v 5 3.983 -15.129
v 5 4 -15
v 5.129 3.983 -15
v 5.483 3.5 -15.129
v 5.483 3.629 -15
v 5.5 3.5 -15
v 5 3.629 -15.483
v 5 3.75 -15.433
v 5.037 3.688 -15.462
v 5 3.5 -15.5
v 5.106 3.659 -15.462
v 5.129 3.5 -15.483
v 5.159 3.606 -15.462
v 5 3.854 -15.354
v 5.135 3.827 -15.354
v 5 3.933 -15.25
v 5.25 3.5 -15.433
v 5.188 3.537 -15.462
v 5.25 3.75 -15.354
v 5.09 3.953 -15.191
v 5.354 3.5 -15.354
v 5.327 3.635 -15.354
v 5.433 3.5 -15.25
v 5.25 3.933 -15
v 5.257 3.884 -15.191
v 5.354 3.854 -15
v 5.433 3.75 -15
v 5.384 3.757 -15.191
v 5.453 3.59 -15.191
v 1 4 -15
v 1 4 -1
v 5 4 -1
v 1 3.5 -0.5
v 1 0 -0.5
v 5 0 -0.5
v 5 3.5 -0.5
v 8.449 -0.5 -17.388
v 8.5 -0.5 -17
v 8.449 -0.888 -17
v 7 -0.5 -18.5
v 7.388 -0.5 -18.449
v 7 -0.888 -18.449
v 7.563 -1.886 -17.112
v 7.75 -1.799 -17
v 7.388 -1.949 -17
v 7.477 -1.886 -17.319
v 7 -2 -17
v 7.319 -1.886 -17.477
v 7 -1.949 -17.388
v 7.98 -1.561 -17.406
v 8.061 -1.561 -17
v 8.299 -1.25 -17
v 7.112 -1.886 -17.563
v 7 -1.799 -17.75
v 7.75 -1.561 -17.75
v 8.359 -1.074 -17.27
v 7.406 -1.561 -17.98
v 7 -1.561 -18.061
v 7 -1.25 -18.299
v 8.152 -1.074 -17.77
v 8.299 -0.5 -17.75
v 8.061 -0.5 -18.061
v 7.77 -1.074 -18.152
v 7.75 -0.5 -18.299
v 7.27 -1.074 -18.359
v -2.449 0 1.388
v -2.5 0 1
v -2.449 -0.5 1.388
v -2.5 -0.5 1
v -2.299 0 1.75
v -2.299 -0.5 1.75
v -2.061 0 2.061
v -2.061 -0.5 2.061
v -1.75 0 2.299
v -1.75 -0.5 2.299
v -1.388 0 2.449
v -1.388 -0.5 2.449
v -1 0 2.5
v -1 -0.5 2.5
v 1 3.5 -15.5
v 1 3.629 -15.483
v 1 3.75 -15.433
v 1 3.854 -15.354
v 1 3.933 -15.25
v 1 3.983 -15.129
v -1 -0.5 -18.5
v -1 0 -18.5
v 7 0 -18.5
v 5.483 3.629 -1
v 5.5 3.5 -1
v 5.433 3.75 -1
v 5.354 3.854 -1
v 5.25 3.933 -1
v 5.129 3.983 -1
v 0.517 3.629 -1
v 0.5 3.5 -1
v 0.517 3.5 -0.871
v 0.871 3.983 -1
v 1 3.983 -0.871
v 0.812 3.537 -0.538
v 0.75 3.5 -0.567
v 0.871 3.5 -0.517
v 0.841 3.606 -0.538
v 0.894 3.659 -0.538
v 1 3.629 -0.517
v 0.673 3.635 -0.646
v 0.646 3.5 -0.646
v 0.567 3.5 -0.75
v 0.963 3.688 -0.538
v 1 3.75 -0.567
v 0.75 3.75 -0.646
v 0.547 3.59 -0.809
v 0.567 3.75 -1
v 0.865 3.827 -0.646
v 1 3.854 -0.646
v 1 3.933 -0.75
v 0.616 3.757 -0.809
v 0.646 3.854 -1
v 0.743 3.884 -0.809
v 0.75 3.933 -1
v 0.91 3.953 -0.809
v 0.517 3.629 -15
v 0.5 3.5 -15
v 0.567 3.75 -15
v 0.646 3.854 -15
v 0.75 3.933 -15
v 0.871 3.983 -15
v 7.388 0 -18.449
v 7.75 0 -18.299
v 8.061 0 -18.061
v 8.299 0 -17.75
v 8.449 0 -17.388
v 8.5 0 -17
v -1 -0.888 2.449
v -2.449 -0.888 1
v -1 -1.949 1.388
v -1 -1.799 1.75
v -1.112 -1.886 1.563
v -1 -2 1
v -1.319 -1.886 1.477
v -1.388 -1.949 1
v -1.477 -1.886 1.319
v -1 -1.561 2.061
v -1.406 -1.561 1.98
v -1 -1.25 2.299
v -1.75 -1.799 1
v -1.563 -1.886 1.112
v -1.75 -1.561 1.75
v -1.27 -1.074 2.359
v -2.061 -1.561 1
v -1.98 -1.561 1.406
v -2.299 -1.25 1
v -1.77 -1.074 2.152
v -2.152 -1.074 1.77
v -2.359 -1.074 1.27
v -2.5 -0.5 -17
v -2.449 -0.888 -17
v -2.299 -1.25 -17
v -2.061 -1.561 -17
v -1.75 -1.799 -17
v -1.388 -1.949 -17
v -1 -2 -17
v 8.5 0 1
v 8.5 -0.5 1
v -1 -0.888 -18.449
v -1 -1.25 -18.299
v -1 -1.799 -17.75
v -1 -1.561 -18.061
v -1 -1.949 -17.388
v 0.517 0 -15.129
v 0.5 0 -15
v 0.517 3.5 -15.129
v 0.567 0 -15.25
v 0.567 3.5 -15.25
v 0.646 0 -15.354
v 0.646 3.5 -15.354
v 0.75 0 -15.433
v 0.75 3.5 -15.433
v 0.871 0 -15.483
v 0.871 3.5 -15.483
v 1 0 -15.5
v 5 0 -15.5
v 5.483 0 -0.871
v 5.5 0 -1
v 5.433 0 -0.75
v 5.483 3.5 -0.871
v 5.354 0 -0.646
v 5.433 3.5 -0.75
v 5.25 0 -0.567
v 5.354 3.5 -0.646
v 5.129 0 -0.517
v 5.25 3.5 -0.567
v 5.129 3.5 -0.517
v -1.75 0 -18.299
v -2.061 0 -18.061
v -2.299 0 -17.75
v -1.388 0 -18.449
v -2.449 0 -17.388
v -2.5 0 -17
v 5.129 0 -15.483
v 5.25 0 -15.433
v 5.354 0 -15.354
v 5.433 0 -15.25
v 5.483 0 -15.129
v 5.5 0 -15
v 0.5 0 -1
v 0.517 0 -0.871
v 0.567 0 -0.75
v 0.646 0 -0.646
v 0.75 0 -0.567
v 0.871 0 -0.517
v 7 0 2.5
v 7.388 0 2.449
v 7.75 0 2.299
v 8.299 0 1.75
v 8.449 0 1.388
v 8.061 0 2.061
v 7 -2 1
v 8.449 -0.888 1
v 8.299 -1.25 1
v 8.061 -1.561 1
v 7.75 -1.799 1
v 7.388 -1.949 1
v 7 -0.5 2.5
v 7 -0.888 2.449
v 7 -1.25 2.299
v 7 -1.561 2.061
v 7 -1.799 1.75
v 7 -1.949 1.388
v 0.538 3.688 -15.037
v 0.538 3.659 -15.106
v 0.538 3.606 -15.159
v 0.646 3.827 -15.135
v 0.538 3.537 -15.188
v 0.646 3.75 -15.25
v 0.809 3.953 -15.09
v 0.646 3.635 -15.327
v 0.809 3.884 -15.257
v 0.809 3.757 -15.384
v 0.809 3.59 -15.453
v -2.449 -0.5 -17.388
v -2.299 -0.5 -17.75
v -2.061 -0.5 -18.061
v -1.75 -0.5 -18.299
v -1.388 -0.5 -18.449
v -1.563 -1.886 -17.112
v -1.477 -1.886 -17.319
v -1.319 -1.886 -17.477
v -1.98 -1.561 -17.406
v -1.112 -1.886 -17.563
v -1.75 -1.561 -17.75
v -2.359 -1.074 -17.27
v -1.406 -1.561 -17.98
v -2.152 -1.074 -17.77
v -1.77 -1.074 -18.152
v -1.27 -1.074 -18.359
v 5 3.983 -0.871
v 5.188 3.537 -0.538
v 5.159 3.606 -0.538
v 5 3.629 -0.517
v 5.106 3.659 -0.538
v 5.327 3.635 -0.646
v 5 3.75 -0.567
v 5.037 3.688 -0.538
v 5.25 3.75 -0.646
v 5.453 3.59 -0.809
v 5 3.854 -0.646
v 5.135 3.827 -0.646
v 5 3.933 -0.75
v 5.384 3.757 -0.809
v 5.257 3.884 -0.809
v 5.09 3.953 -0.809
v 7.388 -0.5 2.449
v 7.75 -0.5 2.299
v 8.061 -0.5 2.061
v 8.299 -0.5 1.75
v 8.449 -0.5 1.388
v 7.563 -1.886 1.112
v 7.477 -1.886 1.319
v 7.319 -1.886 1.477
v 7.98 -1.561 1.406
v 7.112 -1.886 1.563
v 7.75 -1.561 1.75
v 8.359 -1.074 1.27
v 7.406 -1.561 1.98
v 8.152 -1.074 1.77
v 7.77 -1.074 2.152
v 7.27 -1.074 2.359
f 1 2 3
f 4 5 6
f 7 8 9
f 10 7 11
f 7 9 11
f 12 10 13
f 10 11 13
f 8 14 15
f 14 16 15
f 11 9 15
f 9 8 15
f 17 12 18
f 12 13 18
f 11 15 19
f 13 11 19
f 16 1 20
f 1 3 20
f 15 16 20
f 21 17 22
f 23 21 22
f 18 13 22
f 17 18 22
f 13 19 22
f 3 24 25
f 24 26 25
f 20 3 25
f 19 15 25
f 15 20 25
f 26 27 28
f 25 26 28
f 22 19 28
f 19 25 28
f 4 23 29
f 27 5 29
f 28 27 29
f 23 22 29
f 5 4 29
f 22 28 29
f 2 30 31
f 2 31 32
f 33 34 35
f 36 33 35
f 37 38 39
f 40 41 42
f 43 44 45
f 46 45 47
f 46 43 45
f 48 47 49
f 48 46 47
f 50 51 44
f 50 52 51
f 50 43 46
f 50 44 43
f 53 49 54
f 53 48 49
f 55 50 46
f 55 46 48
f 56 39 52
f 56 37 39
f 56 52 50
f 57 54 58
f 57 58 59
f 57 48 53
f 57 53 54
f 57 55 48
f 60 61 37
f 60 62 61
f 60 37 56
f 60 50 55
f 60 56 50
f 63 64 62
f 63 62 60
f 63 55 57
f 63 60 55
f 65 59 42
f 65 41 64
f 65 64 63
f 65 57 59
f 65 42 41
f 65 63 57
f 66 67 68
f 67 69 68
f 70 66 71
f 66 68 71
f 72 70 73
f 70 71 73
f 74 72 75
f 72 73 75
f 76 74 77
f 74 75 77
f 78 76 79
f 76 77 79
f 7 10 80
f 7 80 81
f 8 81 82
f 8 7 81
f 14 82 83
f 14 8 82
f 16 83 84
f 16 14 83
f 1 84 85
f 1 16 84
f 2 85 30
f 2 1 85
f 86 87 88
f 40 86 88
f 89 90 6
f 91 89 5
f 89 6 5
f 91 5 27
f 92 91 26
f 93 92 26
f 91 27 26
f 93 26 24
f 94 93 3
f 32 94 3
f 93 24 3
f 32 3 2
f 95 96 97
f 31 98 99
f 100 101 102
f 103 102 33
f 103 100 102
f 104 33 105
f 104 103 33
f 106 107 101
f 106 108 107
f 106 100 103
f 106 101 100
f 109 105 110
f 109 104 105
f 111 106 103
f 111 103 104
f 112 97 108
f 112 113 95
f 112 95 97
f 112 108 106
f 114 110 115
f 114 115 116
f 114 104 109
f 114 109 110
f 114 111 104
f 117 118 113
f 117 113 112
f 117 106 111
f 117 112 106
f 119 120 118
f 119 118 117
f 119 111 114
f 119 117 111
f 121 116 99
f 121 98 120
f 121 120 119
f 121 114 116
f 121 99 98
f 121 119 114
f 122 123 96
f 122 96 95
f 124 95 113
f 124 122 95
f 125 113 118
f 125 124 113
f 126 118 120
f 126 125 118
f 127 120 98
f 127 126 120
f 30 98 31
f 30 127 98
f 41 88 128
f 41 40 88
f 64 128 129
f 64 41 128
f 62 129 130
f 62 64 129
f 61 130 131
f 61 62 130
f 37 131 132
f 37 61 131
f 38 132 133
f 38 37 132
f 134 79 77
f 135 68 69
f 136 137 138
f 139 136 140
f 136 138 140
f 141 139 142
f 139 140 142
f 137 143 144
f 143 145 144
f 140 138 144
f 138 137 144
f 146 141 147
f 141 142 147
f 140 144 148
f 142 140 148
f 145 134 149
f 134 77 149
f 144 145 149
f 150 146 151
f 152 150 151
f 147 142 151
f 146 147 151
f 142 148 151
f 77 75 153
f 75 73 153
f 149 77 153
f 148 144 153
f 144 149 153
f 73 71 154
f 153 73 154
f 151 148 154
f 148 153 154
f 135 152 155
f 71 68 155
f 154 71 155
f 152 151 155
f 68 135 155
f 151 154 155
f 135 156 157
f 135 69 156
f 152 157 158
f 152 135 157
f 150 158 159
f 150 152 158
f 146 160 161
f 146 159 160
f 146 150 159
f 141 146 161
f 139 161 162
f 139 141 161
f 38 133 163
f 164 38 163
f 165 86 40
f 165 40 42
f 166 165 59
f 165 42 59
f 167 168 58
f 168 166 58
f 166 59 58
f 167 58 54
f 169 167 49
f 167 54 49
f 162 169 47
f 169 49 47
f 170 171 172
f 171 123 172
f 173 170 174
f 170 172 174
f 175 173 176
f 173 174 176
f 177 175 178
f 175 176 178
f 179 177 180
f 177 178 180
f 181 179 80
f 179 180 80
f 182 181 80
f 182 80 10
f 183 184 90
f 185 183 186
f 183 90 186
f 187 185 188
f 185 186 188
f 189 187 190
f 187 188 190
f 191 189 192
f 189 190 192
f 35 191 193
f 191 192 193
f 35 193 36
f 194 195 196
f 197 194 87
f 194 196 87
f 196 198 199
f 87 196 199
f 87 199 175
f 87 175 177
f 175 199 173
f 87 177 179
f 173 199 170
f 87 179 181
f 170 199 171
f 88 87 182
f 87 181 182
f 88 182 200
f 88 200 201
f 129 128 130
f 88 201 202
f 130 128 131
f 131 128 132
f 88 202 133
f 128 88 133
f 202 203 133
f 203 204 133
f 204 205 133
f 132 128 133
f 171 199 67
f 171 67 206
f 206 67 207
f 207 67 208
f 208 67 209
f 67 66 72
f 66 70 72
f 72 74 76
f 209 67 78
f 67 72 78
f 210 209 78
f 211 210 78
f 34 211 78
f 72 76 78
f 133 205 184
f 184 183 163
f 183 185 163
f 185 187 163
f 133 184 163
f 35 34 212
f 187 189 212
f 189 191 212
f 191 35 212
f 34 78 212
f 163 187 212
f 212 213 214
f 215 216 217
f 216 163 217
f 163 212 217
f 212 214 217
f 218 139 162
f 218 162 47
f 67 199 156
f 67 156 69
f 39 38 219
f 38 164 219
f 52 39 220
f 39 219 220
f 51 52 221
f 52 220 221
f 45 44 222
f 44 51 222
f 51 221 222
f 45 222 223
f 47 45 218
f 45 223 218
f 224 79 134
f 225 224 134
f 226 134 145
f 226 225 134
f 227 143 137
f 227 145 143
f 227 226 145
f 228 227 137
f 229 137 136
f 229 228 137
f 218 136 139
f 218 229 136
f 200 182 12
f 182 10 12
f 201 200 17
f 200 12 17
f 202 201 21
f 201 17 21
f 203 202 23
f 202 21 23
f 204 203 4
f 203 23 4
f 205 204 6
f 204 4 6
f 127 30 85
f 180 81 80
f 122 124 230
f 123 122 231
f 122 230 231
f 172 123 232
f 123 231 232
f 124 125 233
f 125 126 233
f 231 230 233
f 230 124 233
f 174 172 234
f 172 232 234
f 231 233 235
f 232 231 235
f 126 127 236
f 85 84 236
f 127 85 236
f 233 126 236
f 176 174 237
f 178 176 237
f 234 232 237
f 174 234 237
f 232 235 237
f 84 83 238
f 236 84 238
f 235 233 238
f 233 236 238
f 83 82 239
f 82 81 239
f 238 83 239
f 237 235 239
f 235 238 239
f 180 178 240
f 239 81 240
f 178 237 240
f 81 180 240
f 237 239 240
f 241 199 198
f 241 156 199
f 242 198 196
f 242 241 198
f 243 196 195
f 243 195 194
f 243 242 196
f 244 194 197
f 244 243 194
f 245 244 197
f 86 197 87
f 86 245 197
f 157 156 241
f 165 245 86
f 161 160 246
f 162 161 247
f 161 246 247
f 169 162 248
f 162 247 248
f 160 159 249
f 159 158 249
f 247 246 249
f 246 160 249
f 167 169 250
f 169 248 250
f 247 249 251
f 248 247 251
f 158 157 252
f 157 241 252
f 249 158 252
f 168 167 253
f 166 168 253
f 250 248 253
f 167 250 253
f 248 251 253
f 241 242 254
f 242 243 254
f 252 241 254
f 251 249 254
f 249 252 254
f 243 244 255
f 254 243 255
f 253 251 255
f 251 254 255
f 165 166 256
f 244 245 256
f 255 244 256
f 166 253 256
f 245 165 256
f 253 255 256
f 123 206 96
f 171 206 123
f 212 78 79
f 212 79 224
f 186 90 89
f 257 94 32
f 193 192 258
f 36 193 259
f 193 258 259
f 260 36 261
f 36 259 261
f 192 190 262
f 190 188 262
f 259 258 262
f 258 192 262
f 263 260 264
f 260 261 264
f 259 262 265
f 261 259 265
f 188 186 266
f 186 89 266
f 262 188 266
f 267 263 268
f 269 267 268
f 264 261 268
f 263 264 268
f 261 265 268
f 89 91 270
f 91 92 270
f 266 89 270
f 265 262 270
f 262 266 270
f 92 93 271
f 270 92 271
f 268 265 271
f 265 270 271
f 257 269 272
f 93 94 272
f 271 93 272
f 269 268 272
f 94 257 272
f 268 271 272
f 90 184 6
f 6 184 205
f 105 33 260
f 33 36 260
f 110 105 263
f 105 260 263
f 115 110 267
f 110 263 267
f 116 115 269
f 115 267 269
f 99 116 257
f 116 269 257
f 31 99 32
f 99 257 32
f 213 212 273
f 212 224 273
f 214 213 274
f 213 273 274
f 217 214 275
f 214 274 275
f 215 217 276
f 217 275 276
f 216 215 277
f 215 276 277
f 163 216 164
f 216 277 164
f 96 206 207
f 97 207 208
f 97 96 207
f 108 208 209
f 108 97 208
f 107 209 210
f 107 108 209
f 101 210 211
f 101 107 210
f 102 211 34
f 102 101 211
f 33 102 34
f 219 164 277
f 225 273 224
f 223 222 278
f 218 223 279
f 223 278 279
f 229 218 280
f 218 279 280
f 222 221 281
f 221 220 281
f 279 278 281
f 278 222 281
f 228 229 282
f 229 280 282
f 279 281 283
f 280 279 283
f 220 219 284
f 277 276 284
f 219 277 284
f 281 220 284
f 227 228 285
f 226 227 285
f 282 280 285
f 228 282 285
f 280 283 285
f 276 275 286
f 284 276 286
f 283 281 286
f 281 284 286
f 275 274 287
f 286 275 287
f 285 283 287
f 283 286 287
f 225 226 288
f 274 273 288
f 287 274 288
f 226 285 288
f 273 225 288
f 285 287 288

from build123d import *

# Parameters (mm, degrees)
SKETCH1_W           = 5
SKETCH1_H           = 15
BOSS_EXTRUDE1_DEPTH = 4
SKETCH2_W           = 11
SKETCH2_H           = 21
BOSS_EXTRUDE2_DEPTH = 2
FILLET1_R           = 0.5
FILLET2_R           = 1.5


with BuildPart() as part:
    # Sketch1 → Boss-Extrude1 (new body)
    with BuildSketch(Plane(origin=(0, 0, 0), x_dir=(1, 0, 0), z_dir=(0, 1, 0))):
        with Locations((3, 8)):
            Rectangle(SKETCH1_W, SKETCH1_H)
    extrude(amount=BOSS_EXTRUDE1_DEPTH)

    # Sketch2 → Boss-Extrude2 (add)
    with BuildSketch(Plane.XZ):
        with Locations((3, -8)):
            Rectangle(SKETCH2_W, SKETCH2_H)
    extrude(amount=BOSS_EXTRUDE2_DEPTH)

    # Fillet1
    fillet1_edges = [part.edges().sort_by_distance(p)[0] for p in [
        (5.5, 4, -8),
        (3, 4, -15.5),
        (0.5, 4, -8),
        (0.5, 2, -15.5),
        (5.5, 2, -15.5),
        (5.5, 2, -0.5),
        (0.5, 2, -0.5),
        (3, 4, -0.5),
    ]]
    fillet(fillet1_edges, radius=FILLET1_R)

    # Fillet2
    fillet2_edges = [part.edges().sort_by_distance(p)[0] for p in [
        (8.5, -1, -18.5),
        (8.5, -1, 2.5),
        (-2.5, -1, 2.5),
        (-2.5, -1, -18.5),
        (8.5, -2, -8),
        (3, -2, 2.5),
        (-2.5, -2, -8),
        (3, -2, -18.5),
    ]]
    fillet(fillet2_edges, radius=FILLET2_R)


solid = part.part
